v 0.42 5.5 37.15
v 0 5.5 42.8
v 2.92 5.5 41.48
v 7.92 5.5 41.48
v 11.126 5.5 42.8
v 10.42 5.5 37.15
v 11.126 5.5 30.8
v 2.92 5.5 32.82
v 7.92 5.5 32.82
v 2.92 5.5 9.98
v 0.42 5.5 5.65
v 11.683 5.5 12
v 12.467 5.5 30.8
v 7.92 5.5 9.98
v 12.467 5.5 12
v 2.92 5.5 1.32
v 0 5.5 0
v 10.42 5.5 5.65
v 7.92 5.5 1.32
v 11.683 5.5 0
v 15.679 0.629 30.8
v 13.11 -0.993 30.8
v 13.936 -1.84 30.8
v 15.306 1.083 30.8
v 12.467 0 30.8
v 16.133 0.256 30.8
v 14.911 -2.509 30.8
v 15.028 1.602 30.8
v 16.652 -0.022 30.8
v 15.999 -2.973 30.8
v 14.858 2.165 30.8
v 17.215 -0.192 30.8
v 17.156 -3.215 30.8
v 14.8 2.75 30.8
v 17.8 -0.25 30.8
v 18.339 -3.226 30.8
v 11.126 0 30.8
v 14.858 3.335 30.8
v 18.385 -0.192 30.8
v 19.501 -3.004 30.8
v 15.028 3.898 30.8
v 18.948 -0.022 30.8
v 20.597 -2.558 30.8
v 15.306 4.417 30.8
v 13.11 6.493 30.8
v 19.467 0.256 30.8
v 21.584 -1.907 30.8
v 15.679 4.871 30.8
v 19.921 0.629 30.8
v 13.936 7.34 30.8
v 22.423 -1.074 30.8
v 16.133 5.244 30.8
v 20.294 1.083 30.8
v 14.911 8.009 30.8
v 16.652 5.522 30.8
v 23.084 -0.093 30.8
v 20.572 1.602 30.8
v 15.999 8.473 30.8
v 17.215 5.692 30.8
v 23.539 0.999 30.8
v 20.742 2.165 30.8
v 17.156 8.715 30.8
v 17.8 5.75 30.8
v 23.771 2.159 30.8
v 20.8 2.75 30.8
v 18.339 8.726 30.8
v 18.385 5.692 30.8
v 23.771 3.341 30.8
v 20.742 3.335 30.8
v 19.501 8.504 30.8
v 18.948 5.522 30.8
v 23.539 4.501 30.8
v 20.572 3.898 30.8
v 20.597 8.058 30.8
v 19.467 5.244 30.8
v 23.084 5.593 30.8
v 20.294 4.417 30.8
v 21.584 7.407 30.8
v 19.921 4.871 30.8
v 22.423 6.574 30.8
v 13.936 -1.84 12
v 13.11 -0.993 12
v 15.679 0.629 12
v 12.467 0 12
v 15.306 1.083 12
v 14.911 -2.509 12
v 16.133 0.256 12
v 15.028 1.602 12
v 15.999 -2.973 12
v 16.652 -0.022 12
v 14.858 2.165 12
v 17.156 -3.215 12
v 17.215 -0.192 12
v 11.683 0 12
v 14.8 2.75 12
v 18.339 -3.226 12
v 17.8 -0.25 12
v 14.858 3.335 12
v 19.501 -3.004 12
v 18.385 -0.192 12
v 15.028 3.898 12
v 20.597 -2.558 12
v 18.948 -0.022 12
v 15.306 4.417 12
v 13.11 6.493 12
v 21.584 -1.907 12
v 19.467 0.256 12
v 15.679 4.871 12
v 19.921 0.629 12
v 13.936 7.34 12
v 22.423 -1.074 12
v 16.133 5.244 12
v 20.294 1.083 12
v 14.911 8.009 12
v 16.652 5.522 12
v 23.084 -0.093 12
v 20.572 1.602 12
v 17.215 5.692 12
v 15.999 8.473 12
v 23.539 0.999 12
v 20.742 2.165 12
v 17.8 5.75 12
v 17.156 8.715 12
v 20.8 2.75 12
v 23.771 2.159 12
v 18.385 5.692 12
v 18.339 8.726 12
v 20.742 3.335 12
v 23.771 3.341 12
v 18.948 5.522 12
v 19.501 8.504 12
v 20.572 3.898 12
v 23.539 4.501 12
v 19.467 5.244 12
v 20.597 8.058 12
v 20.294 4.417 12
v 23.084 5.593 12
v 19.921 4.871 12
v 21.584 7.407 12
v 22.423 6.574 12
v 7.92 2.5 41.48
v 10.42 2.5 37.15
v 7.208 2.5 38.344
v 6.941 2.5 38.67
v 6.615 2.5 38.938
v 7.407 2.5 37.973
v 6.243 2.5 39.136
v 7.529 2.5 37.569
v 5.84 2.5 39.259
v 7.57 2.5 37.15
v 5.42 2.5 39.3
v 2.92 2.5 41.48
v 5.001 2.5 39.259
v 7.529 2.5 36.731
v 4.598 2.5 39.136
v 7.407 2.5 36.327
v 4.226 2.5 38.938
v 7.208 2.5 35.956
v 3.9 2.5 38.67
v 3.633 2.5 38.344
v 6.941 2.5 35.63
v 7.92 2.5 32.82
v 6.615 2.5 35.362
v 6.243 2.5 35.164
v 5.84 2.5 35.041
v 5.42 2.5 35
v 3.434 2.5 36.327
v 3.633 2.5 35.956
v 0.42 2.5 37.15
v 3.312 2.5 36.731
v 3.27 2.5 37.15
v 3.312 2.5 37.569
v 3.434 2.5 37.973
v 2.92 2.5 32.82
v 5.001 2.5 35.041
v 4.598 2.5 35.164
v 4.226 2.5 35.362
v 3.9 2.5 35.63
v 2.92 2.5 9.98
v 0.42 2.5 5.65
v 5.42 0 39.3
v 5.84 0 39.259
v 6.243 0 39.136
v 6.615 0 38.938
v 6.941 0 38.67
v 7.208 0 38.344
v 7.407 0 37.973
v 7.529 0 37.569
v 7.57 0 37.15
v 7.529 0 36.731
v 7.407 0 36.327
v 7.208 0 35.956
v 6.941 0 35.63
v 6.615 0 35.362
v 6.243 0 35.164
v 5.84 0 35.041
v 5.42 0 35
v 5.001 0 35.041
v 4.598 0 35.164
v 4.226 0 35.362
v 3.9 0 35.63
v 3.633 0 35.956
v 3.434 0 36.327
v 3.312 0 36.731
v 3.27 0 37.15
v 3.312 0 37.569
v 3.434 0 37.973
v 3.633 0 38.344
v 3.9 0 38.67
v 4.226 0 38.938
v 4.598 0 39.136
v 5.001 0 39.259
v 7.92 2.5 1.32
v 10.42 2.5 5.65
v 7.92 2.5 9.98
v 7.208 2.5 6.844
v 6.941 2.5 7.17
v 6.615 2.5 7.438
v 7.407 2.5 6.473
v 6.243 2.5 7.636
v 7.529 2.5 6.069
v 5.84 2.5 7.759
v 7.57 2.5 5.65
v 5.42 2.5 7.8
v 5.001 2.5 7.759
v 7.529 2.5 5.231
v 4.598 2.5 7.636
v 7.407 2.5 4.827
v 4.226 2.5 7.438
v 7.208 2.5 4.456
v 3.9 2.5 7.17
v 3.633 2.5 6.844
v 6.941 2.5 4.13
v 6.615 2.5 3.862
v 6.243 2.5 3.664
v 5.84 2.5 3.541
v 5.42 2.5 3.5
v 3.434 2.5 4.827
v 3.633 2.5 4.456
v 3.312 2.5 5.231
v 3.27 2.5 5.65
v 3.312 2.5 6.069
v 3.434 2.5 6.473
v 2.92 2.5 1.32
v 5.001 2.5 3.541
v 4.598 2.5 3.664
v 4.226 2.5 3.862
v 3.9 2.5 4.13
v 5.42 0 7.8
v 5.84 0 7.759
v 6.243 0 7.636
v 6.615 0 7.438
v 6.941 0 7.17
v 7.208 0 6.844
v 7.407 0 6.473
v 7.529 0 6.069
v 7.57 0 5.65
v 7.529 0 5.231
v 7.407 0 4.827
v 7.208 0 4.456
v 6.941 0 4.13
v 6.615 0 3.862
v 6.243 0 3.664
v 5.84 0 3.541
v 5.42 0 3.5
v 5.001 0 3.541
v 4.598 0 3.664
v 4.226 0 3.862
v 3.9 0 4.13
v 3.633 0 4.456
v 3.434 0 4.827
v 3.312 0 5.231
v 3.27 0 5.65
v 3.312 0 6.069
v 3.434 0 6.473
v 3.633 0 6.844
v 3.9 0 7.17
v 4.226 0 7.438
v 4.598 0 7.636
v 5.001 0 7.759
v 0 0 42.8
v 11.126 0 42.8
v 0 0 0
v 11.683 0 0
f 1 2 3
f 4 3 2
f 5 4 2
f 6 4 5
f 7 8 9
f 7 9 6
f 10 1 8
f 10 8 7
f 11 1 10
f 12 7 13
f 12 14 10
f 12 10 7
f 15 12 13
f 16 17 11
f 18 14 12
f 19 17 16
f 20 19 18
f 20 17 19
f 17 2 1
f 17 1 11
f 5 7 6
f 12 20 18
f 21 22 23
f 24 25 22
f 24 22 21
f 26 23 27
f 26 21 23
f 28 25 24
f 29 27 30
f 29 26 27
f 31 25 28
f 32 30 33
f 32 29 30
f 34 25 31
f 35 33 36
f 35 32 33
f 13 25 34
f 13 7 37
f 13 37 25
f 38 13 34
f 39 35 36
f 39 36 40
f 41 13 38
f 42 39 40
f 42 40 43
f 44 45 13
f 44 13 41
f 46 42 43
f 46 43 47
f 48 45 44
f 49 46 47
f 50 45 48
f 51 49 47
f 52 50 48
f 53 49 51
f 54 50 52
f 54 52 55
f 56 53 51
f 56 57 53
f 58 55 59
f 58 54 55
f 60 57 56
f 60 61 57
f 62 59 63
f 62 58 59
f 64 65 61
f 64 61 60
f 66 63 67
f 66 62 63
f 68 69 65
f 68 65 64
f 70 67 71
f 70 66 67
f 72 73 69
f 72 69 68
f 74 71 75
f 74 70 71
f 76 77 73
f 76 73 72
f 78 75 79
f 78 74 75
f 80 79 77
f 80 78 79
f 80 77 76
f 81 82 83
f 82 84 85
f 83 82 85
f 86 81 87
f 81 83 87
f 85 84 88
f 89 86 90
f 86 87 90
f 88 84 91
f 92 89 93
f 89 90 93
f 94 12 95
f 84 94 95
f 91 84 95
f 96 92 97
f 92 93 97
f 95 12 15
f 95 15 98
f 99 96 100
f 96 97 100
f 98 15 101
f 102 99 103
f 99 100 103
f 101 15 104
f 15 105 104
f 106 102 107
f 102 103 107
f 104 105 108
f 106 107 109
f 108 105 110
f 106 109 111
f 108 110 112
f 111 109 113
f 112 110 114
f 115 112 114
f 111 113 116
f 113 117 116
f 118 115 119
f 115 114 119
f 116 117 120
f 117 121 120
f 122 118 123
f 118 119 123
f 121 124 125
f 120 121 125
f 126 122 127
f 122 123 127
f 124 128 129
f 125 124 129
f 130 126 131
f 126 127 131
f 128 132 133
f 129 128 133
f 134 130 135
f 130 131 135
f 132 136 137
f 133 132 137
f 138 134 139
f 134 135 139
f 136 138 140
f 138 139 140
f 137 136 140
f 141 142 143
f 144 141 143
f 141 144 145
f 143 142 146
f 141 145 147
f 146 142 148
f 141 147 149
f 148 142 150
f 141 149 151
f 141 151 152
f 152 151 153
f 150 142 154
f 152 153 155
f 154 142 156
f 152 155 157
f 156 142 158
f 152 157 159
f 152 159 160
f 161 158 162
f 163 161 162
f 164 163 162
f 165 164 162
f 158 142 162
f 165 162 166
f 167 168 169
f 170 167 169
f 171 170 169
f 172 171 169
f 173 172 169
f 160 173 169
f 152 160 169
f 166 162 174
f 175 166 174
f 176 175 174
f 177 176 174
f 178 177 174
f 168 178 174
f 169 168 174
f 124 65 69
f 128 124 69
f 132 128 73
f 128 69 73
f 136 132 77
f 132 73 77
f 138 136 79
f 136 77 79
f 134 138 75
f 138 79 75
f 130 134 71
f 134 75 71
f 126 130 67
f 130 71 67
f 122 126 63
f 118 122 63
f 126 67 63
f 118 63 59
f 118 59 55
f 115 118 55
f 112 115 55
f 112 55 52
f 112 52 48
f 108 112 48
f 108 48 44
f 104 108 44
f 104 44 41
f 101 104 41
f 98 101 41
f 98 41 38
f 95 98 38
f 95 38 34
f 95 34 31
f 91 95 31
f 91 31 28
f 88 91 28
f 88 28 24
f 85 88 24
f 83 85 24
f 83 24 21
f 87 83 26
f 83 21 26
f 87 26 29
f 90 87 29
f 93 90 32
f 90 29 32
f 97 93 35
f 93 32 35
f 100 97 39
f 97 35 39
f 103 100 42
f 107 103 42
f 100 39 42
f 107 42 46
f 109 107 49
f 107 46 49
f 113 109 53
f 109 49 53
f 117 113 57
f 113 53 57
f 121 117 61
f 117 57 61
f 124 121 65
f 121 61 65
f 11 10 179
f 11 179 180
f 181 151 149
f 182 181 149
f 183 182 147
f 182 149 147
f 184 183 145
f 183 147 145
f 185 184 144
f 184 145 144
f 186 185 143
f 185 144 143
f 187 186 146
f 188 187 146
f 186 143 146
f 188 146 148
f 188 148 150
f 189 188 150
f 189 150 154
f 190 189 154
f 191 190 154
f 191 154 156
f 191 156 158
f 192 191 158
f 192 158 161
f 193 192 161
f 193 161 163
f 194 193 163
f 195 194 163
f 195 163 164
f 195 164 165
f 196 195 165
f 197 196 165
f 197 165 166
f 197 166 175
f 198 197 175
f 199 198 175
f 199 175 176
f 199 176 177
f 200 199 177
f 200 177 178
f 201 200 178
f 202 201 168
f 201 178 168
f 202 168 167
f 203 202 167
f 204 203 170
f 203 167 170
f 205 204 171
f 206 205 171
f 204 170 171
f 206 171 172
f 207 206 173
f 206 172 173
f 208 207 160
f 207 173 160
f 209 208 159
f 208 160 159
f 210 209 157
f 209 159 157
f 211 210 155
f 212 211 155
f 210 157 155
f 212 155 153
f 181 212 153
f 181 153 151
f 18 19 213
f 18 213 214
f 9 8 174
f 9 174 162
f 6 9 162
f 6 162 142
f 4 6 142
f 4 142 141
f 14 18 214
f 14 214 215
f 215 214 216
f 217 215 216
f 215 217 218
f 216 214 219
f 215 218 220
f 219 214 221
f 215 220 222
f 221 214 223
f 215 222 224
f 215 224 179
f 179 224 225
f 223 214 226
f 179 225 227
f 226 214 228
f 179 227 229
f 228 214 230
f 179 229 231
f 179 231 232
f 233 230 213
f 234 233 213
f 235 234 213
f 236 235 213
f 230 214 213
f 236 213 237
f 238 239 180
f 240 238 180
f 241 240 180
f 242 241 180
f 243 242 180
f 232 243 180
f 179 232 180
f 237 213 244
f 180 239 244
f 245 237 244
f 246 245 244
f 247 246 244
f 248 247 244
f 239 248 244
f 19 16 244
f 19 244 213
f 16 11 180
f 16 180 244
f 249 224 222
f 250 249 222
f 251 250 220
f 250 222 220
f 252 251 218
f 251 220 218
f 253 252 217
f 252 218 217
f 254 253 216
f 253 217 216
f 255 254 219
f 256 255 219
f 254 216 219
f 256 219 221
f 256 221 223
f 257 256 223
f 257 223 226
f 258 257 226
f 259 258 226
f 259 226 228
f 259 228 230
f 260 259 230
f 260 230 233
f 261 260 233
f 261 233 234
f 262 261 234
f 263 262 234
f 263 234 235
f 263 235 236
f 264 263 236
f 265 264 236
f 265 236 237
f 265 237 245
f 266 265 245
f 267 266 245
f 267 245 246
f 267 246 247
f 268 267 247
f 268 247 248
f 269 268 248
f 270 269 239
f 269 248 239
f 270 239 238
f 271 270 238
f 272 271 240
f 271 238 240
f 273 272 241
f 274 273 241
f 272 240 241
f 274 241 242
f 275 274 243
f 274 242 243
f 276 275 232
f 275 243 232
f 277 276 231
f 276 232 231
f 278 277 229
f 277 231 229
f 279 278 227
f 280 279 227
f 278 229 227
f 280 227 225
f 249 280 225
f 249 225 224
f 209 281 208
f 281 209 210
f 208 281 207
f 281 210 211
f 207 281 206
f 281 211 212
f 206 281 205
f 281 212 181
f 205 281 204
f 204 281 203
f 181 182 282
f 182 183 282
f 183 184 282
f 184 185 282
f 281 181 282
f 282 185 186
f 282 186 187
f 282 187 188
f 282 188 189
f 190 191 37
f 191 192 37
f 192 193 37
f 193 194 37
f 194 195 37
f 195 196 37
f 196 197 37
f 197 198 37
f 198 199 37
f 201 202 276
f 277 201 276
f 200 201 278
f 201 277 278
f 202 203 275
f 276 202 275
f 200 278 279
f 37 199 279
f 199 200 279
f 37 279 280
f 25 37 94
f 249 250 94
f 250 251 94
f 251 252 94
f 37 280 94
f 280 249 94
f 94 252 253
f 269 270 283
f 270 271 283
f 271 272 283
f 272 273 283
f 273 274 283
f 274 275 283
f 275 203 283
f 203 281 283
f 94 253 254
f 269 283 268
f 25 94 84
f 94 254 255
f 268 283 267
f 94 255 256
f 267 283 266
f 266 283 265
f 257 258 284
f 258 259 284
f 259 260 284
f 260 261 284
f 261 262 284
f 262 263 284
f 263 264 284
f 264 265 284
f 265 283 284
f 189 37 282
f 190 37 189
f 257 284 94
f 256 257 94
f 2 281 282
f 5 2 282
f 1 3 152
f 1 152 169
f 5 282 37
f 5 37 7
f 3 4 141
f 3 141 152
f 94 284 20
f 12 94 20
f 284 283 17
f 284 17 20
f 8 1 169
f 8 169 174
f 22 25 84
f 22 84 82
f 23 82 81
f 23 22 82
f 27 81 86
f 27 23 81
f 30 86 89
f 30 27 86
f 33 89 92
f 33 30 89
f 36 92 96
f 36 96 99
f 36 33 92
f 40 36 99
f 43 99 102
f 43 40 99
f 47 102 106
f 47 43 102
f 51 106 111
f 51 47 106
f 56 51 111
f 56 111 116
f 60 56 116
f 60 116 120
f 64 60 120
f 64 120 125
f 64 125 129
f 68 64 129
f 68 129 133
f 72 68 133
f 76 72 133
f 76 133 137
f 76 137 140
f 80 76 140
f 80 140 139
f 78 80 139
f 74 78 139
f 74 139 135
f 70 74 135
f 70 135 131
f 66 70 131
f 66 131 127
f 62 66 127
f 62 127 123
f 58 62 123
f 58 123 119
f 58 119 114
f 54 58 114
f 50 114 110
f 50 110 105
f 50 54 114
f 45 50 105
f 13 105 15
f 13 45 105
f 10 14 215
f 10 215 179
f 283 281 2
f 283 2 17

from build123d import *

# Parameters (mm, degrees)
SKETCH_1_W          = 17.8
SKETCH_1_H          = 42.8
EXTRUDE_1_DEPTH     = 5.5
SKETCH_6_R          = 2.15
CUT_EXTRUDE_3_DEPTH = 10
CUT_EXTRUDE_4_DEPTH = 3
SKETCH_10_R         = 6
EXTRUDE_5_DEPTH     = 18.8
SKETCH_12_W         = 9.298485121
SKETCH_12_H         = 14.239097106
CUT_EXTRUDE_5_DEPTH = 12
SKETCH_13_W         = 8.310362724
SKETCH_13_H         = 15.683275995
CUT_EXTRUDE_6_DEPTH = 12
SKETCH_14_R         = 3
CUT_EXTRUDE_7_DEPTH = 22


with BuildPart() as part:
    # 草图1 → 凸台-拉伸1 (new body)
    with BuildSketch(Plane(origin=(0, 0, 0), x_dir=(1, 0, 0), z_dir=(0, 1, 0))):
        with Locations((8.9, -21.4)):
            Rectangle(SKETCH_1_W, SKETCH_1_H)
    extrude(amount=EXTRUDE_1_DEPTH)

    # 草图6 → 切除-拉伸3 (cut)
    with BuildSketch(Plane(origin=(0, 5.5, 0), x_dir=(1, 0, 0), z_dir=(0, 1, 0))):
        with Locations(Location((5.420411498, -5.65, 0), (0, 0, 270))):
            Circle(SKETCH_6_R)
        with Locations(Location((5.420411498, -37.15, 0), (0, 0, 270))):
            Circle(SKETCH_6_R)
    extrude(amount=-CUT_EXTRUDE_3_DEPTH, mode=Mode.SUBTRACT)

    # 草图7 → 切除-拉伸4 (cut)
    with BuildSketch(Plane(origin=(0, 5.5, 0), x_dir=(1, 0, 0), z_dir=(0, 1, 0))):
        Polygon((2.920411498, -1.319872981), (7.920411498, -1.319872981), (10.420411498, -5.65), (7.920411498, -9.980127019), (2.920411498, -9.980127019), (0.420411498, -5.65), align=None)
        Polygon((0.420411498, -37.15), (2.920411498, -32.819872981), (7.920411498, -32.819872981), (10.420411498, -37.15), (7.920411498, -41.480127019), (2.920411498, -41.480127019), align=None)
    extrude(amount=-CUT_EXTRUDE_4_DEPTH, mode=Mode.SUBTRACT)

    # 草图10 → 凸台-拉伸5 (add)
    with BuildSketch(Plane.XY.offset(30.8)):
        with Locations((17.8, 2.75)):
            Circle(SKETCH_10_R)
    extrude(amount=-EXTRUDE_5_DEPTH)

    # 草图12 → 切除-拉伸5 (cut)
    with BuildSketch(Plane.XY.offset(42.8)):
        with Locations((15.774868429, 2.737331764)):
            Rectangle(SKETCH_12_W, SKETCH_12_H)
    extrude(amount=-CUT_EXTRUDE_5_DEPTH, mode=Mode.SUBTRACT)

    # 草图13 → 切除-拉伸6 (cut)
    with BuildSketch(Plane(origin=(0, 0, 0), x_dir=(-1, 0, 0), z_dir=(0, 0, -1))):
        with Locations((-15.838209607, 3.510094151)):
            Rectangle(SKETCH_13_W, SKETCH_13_H)
    extrude(amount=-CUT_EXTRUDE_6_DEPTH, mode=Mode.SUBTRACT)

    # 草图14 → 切除-拉伸7 (cut)
    with BuildSketch(Plane.XY.offset(30.8)):
        with Locations((17.8, 2.75)):
            Circle(SKETCH_14_R)
    extrude(amount=-CUT_EXTRUDE_7_DEPTH, mode=Mode.SUBTRACT)


solid = part.part
